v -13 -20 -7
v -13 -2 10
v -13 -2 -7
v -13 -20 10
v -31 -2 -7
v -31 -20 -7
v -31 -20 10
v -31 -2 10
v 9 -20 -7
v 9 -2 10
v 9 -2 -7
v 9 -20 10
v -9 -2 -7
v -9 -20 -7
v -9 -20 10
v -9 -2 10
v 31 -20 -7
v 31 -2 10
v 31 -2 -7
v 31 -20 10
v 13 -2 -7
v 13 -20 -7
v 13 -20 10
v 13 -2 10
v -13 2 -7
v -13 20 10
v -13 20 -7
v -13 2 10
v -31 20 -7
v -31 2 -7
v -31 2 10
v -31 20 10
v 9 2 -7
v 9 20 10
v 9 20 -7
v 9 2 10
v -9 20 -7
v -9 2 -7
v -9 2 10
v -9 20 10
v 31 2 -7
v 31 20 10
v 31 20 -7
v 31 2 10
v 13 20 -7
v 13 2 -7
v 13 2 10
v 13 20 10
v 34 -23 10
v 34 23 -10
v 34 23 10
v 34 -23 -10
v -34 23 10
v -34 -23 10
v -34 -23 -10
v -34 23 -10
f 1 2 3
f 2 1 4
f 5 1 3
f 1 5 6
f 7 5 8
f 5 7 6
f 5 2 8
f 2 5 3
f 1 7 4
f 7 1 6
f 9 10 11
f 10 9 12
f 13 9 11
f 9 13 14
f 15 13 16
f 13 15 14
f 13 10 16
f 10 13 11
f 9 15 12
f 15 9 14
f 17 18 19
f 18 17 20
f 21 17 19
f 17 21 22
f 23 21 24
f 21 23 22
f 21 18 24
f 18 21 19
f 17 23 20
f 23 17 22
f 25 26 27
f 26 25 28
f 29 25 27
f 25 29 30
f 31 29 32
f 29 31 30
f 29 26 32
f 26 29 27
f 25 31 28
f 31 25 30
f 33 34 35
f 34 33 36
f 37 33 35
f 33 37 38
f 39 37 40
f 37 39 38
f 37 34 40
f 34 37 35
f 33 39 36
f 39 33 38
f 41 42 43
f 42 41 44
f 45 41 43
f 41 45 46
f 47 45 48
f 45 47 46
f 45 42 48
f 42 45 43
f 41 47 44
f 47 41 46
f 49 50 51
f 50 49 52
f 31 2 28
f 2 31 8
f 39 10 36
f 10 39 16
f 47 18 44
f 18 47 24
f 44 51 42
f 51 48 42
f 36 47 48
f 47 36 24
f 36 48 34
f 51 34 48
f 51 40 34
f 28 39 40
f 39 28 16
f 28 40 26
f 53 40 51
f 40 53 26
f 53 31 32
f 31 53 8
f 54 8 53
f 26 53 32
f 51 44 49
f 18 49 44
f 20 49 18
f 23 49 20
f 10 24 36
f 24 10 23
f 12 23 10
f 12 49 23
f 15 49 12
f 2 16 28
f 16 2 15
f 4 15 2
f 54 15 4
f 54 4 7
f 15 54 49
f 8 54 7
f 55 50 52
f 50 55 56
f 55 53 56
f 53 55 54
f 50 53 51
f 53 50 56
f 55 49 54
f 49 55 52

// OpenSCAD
$fn = 32;

// ----------------------------------------------------------------------
// Pocket plate 68 x 46 x 20
// 2 x 3 pockets 18 mm square, 17 mm deep
// ----------------------------------------------------------------------

// --- parameters (mm) ---
thickness = 20;  // plate thickness
floor_t = 3;     // material left under each pocket
pocket = 18;     // pocket side length
pitch_x = 22;    // pocket pitch along X
pitch_y = 22;    // pocket pitch along Y
cols = 3;        // pockets per row
rows = 2;        // rows of pockets

// --- derived feature positions (mm) ---
depth = thickness - floor_t;        // = 17   pocket depth, down to the floor
span_x = (cols - 1) * pitch_x;      // = 44   distance between outer pockets
span_y = (rows - 1) * pitch_y;      // = 22   distance between outer pocket rows
origin_x = -span_x / 2;             // = -22   X of the first pocket
origin_y = -span_y / 2;             // = -11   Y of the first pocket
plate = [span_x + pocket + 6, span_y + pocket + 6, thickness];  // = [68, 46, 20]   overall size: pockets plus 3 mm of wall on each side
feature_centers = [
  [origin_x + 0 * pitch_x, origin_y + 0 * pitch_y],
  [origin_x + 1 * pitch_x, origin_y + 0 * pitch_y],
  [origin_x + 2 * pitch_x, origin_y + 0 * pitch_y],
  [origin_x + 0 * pitch_x, origin_y + 1 * pitch_y],
  [origin_x + 1 * pitch_x, origin_y + 1 * pitch_y],
  [origin_x + 2 * pitch_x, origin_y + 1 * pitch_y]
];   // pocket centres, used verbatim by the cutter loop

// plate outline, then one pocket per centre in feature_centers
difference() {
  cube(plate, center = true);
  for (centre = feature_centers)
    translate([centre[0] - pocket / 2, centre[1] - pocket / 2, plate[2] / 2 - depth])
      cube([pocket, pocket, depth + 1]);  // centred on the declared pocket centre
}
